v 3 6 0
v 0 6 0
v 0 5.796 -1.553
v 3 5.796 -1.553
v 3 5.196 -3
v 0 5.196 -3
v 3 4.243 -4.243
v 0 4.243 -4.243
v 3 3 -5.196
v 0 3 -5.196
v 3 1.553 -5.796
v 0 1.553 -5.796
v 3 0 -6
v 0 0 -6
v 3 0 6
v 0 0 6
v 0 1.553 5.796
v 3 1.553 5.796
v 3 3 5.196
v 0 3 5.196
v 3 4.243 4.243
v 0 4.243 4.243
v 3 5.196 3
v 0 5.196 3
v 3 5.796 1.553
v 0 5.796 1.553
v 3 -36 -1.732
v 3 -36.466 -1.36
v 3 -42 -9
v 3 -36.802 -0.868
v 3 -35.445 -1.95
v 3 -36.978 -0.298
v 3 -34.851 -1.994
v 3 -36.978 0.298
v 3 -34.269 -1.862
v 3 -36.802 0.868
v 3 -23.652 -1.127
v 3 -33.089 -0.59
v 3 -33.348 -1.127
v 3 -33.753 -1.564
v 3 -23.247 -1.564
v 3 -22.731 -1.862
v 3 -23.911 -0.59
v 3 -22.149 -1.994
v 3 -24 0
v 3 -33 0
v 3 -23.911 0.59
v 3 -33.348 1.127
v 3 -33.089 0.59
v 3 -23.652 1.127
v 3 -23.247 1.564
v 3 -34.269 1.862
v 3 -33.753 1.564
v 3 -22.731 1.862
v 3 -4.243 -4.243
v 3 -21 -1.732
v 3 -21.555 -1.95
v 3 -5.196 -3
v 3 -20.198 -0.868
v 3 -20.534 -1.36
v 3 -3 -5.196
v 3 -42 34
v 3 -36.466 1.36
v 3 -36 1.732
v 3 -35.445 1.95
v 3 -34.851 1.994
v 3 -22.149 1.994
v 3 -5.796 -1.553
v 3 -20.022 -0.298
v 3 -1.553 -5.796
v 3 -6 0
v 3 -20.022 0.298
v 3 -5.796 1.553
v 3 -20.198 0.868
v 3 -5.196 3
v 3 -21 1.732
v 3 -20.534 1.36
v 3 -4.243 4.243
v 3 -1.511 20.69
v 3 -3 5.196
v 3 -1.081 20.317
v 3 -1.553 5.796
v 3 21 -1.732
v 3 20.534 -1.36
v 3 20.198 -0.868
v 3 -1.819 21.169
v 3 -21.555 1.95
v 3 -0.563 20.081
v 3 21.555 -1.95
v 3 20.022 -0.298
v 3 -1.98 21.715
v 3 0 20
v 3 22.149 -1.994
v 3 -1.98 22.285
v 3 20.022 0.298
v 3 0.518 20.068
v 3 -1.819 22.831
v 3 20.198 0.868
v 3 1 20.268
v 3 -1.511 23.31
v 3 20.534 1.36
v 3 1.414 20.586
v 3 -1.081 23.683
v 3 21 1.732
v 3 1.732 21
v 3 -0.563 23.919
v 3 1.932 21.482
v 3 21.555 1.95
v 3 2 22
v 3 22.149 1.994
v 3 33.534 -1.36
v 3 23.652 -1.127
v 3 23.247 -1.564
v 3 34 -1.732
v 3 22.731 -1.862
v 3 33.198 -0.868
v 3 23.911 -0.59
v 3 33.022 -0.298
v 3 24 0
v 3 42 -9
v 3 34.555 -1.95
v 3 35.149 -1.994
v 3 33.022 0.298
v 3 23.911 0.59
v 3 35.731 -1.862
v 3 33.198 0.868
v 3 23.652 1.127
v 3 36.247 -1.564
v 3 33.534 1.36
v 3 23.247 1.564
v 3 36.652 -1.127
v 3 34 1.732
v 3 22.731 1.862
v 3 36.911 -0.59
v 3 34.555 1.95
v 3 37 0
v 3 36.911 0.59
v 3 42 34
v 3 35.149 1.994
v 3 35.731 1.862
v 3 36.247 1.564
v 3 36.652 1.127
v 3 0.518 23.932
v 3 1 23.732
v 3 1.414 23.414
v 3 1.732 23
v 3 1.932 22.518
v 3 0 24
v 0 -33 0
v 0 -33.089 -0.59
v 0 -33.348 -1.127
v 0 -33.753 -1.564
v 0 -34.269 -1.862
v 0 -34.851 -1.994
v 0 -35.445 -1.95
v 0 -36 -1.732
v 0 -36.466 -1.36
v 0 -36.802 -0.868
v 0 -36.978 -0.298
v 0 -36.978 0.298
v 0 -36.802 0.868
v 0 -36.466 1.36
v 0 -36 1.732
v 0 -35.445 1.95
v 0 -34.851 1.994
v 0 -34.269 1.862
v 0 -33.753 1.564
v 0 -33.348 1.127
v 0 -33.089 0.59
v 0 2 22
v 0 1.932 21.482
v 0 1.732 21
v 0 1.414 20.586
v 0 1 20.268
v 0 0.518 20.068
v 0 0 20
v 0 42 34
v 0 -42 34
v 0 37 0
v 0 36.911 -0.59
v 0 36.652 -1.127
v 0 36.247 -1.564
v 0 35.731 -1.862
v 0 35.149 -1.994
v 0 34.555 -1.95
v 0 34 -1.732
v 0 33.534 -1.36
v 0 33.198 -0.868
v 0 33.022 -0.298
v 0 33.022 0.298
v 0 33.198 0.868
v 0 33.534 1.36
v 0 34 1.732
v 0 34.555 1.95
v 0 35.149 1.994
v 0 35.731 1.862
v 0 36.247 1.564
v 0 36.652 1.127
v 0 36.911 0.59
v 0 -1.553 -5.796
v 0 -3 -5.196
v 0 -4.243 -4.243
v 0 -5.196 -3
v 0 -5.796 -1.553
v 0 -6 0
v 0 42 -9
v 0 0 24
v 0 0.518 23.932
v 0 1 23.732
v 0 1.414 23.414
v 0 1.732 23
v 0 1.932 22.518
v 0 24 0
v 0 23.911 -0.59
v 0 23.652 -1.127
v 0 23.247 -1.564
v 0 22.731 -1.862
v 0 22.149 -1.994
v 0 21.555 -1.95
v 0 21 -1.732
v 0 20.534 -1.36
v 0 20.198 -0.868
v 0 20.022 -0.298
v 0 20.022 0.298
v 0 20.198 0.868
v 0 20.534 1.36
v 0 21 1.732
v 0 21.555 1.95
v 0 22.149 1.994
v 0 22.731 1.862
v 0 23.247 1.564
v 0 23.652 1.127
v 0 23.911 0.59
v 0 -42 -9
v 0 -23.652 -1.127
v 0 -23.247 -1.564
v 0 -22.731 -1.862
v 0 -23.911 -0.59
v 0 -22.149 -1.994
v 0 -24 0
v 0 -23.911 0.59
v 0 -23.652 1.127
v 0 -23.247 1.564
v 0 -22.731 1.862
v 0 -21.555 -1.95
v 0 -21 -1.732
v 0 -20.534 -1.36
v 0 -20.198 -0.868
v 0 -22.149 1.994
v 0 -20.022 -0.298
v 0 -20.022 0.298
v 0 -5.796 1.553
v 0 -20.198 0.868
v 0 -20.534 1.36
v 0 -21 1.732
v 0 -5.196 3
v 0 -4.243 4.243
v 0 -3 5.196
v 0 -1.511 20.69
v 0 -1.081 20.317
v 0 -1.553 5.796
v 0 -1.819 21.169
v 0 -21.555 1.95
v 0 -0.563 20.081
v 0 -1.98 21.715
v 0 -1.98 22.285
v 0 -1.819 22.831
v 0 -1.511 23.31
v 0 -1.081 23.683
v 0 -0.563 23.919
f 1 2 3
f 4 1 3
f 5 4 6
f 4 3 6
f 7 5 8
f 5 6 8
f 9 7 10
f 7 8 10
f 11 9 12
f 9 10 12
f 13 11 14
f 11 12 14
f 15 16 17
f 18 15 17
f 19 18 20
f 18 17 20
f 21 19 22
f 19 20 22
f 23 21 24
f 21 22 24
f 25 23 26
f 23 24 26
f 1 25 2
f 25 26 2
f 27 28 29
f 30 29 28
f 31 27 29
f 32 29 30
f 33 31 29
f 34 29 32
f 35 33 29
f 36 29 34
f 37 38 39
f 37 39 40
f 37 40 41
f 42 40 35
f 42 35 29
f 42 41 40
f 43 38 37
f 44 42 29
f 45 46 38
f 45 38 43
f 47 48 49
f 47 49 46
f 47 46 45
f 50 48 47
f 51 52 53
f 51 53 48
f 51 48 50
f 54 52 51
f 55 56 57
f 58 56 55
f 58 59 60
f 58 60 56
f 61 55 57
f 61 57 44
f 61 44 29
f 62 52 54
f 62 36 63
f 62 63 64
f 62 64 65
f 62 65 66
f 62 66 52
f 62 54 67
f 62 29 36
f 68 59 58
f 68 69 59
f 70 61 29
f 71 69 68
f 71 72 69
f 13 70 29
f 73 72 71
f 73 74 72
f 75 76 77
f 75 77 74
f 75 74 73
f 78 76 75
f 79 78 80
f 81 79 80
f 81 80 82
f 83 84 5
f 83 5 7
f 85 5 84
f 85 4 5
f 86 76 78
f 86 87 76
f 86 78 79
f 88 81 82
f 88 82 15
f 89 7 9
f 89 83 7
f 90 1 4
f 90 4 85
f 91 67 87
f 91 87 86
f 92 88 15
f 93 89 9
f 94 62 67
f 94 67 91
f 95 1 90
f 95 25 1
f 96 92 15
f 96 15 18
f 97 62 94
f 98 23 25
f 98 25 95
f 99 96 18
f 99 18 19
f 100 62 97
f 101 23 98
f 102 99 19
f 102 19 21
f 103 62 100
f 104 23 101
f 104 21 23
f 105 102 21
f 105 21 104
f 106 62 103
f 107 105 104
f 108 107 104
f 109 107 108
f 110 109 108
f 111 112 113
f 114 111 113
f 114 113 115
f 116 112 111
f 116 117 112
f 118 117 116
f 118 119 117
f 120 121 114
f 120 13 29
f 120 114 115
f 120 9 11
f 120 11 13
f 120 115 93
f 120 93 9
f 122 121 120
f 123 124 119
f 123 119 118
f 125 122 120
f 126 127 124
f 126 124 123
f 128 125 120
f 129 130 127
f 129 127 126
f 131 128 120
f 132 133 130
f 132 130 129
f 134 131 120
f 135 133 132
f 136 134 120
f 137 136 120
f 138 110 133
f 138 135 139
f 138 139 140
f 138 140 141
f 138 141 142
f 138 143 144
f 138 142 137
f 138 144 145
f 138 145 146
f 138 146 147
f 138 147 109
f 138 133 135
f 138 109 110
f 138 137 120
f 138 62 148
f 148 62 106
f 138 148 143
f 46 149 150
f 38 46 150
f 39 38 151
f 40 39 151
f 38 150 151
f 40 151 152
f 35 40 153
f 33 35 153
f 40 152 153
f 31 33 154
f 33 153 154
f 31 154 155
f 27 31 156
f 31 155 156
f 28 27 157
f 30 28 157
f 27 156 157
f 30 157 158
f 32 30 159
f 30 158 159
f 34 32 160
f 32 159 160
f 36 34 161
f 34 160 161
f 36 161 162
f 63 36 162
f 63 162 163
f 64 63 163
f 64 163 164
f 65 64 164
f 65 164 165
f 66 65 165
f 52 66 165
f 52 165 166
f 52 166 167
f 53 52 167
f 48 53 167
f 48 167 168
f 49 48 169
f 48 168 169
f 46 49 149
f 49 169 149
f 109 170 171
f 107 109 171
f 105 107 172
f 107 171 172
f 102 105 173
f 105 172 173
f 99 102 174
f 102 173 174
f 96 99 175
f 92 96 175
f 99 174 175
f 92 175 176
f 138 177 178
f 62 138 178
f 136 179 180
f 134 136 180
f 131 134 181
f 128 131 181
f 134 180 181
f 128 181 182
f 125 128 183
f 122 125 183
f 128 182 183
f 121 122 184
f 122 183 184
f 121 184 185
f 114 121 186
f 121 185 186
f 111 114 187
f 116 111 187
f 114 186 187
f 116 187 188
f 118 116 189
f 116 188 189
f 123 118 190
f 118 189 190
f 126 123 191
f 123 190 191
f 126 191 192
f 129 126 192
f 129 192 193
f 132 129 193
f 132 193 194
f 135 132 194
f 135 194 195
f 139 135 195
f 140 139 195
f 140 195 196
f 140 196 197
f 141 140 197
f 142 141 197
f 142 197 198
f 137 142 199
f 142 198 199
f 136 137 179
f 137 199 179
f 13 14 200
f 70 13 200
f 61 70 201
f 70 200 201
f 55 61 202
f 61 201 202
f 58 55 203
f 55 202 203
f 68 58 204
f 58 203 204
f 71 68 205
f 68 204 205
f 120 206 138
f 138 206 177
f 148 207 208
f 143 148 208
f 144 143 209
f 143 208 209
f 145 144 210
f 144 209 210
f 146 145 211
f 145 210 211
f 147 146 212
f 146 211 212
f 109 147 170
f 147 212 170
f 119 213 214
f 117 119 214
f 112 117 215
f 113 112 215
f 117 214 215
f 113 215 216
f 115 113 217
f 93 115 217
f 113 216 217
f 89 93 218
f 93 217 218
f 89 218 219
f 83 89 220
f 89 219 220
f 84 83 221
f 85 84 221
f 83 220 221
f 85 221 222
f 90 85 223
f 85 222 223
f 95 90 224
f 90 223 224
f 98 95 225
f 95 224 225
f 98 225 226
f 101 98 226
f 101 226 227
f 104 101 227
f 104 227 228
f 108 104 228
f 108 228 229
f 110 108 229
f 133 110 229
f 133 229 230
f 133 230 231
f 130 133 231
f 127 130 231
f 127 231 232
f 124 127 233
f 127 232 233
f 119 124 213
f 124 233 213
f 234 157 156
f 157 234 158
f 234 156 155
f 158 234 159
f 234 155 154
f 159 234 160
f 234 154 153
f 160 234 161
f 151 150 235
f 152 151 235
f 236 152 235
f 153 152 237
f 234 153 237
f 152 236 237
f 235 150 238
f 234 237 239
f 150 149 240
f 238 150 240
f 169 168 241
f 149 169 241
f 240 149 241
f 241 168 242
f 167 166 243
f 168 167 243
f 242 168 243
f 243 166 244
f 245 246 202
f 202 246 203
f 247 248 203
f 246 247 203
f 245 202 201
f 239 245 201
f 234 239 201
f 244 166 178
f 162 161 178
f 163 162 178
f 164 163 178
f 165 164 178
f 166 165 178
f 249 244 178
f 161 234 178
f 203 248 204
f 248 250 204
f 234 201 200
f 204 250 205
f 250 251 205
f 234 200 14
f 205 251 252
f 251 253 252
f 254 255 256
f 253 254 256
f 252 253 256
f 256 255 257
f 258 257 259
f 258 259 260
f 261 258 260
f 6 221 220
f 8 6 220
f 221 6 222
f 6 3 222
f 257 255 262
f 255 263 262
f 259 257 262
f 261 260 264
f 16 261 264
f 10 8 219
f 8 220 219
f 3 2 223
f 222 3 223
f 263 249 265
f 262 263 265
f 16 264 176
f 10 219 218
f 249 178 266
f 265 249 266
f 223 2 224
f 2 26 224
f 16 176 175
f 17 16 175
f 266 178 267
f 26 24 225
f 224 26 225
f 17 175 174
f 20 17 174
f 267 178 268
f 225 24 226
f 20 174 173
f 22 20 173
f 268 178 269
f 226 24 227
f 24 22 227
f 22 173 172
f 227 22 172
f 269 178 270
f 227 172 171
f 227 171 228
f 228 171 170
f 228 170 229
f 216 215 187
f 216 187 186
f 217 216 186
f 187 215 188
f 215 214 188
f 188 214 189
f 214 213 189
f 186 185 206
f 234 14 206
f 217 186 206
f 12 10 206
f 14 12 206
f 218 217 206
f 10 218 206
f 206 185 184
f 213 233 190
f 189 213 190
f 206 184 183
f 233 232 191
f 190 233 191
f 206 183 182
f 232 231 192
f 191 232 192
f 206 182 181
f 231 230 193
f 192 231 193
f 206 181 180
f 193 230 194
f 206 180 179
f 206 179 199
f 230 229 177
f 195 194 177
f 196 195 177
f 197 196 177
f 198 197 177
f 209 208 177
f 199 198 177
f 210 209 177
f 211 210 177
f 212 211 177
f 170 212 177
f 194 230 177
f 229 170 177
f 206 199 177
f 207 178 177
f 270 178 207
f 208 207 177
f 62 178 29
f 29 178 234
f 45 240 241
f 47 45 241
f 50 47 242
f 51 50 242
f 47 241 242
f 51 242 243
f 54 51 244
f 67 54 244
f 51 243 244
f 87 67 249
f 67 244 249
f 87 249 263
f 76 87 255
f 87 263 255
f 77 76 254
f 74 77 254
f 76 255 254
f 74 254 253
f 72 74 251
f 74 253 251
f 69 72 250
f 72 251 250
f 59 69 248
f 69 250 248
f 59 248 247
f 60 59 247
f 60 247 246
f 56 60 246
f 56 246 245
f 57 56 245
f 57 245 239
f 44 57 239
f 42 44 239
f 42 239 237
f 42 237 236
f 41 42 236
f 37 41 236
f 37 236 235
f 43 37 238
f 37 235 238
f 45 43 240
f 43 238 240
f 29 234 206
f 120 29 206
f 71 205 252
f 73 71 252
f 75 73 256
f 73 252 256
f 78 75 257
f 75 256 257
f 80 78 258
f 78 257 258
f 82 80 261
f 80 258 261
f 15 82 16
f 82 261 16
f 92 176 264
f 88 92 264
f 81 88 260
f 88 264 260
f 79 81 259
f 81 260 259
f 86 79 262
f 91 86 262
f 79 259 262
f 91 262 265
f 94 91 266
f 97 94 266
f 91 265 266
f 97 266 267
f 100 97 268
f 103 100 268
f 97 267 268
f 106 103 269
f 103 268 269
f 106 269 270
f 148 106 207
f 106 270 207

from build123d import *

# Parameters (mm, degrees)
F1_DEPTH = 3


with BuildPart() as f1:
    # F0 (on Right) → F1 (new body)
    with BuildSketch(Plane.YZ):
        with BuildLine():
            Line((-33, 9), (-33, 0))
            Line((-33, 0), (-24, 0))
            ThreePointArc((-24, 0), (-26.6360389693, 6.3639610307), (-33, 9))
        make_face()
        with BuildLine():
            ThreePointArc((-37, 0), (-35, 2), (-33, 0))
            Line((-33, 0), (-33, 9))
            ThreePointArc((-33, 9), (-39.3639610307, 6.3639610307), (-42, 0))
            Line((-42, 0), (-37, 0))
        make_face()
        with BuildLine():
            Line((-24, 0), (-33, 0))
            Line((-33, 0), (-33, -9))
            ThreePointArc((-33, -9), (-26.6360389693, -6.3639610307), (-24, 0))
        make_face()
        with BuildLine():
            Line((-33, -9), (-33, 0))
            ThreePointArc((-33, 0), (-35, -2), (-37, 0))
            Line((-37, 0), (-42, 0))
            ThreePointArc((-42, 0), (-39.3639610307, -6.3639610307), (-33, -9))
        make_face()
        with BuildLine():
            ThreePointArc((-20, 0), (-22, -2), (-24, 0))
            ThreePointArc((-24, 0), (-26.6360389693, -6.3639610307), (-33, -9))
            Line((-33, -9), (-25, -9))
            Line((-25, -9), (-4.3588989435, -9))
            ThreePointArc((-4.3588989435, -9), (-8.4731632061, -5.310885546), (-10, 0))
            Line((-10, 0), (-20, 0))
        make_face()
        with BuildLine():
            ThreePointArc((-33, 9), (-26.6360389693, 6.3639610307), (-24, 0))
            ThreePointArc((-24, 0), (-22, 2), (-20, 0))
            Line((-20, 0), (-10, 0))
            ThreePointArc((-10, 0), (-7.0710678119, 7.0710678119), (0, 10))
            Line((0, 10), (0, 20))
            ThreePointArc((0, 20), (-2, 21.9999999928), (-1.44e-08, 24))
            ThreePointArc((-1.44e-08, 24), (-4.7434164964, 25.3514707334), (-8.0622577483, 29))
            Line((-8.0622577483, 29), (-9, 29))
            Line((-9, 29), (-9, 25))
            ThreePointArc((-9, 25), (-13.686291501, 13.686291501), (-25, 9))
            Line((-25, 9), (-33, 9))
        make_face()
        with BuildLine():
            ThreePointArc((-42, 0), (-39.3639610307, 6.3639610307), (-33, 9))
            Line((-33, 9), (-25, 9))
            ThreePointArc((-25, 9), (-13.686291501, 13.686291501), (-9, 25))
            Line((-9, 25), (-9, 29))
            Line((-9, 29), (-42, 29))
            Line((-42, 29), (-42, 0))
        make_face()
        with BuildLine():
            Line((-42, -9), (-33, -9))
            ThreePointArc((-33, -9), (-39.3639610307, -6.3639610307), (-42, 0))
            Line((-42, 0), (-42, -9))
        make_face()
        with BuildLine():
            ThreePointArc((0, 10), (-7.0710678119, 7.0710678119), (-10, 0))
            Line((-10, 0), (-6, 0))
            ThreePointArc((-6, 0), (-4.2426406871, 4.2426406871), (0, 6))
            Line((0, 6), (0, 10))
        make_face()
        with BuildLine():
            Line((-6, 0), (-10, 0))
            ThreePointArc((-10, 0), (-8.4731632061, -5.310885546), (-4.3588989435, -9))
            Line((-4.3588989435, -9), (0, -9))
            Line((0, -9), (0, -6))
            ThreePointArc((0, -6), (-4.2426406871, -4.2426406871), (-6, 0))
        make_face()
        with BuildLine():
            Line((-42, 34), (-42, 29))
            Line((-42, 29), (-9, 29))
            Line((-9, 29), (-9, 33))
            ThreePointArc((-9, 33), (-8.9860571774, 33.5007758031), (-8.94427191, 34))
            Line((-8.94427191, 34), (-42, 34))
        make_face()
        with BuildLine():
            ThreePointArc((10, 0), (7.0710678119, 7.0710678119), (0, 10))
            Line((0, 10), (0, 6))
            ThreePointArc((0, 6), (4.2426406871, 4.2426406871), (6, 0))
            Line((6, 0), (10, 0))
        make_face()
        with BuildLine():
            Line((0, 20), (0, 10))
            ThreePointArc((0, 10), (7.0710678119, 7.0710678119), (10, 0))
            Line((10, 0), (20, 0))
            ThreePointArc((20, 0), (22, 2), (24, 0))
            ThreePointArc((24, 0), (26.6360389693, 6.3639610307), (33, 9))
            Line((33, 9), (25, 9))
            ThreePointArc((25, 9), (13.686291501, 13.686291501), (9, 25))
            Line((9, 25), (9, 29))
            Line((9, 29), (8.0622577483, 29))
            ThreePointArc((8.0622577483, 29), (4.7434164841, 25.3514707258), (-1.44e-08, 24))
            ThreePointArc((-1.44e-08, 24), (1.4142135573, 23.4142135675), (2, 22))
            ThreePointArc((2, 22), (1.4142135624, 20.5857864376), (0, 20))
        make_face()
        with BuildLine():
            Line((-9, 33), (-9, 29))
            Line((-9, 29), (-8.0622577483, 29))
            ThreePointArc((-8.0622577483, 29), (-8.7624288794, 30.9457750531), (-9, 33))
        make_face()
        with BuildLine():
            Line((0, -6), (0, -9))
            Line((0, -9), (4.3588989435, -9))
            ThreePointArc((4.3588989435, -9), (8.4731632061, -5.310885546), (10, 0))
            Line((10, 0), (6, 0))
            ThreePointArc((6, 0), (4.2426406871, -4.2426406871), (0, -6))
        make_face()
        with BuildLine():
            Line((20, 0), (10, 0))
            ThreePointArc((10, 0), (8.4731632061, -5.310885546), (4.3588989435, -9))
            Line((4.3588989435, -9), (25, -9))
            Line((25, -9), (33, -9))
            ThreePointArc((33, -9), (26.6360389693, -6.3639610307), (24, 0))
            ThreePointArc((24, 0), (22, -2), (20, 0))
        make_face()
        with BuildLine():
            Line((0, 33), (-9, 33))
            ThreePointArc((-9, 33), (-8.7624288794, 30.9457750531), (-8.0622577483, 29))
            Line((-8.0622577483, 29), (0, 29))
            Line((0, 29), (0, 33))
        make_face()
        with BuildLine():
            ThreePointArc((-8.94427191, 34), (-8.9860571774, 33.5007758031), (-9, 33))
            Line((-9, 33), (0, 33))
            ThreePointArc((0, 33), (-1, 33.2679491924), (-1.7320508076, 34))
            Line((-1.7320508076, 34), (-8.94427191, 34))
        make_face()
        with BuildLine():
            Line((0, 29), (-8.0622577483, 29))
            ThreePointArc((-8.0622577483, 29), (-4.7434164964, 25.3514707334), (-1.44e-08, 24))
            Line((0, 24), (0, 29))
        make_face()
        with BuildLine():
            Line((0, 29), (0, 24))
            ThreePointArc((-1.44e-08, 24), (4.7434164841, 25.3514707258), (8.0622577483, 29))
            Line((8.0622577483, 29), (0, 29))
        make_face()
        with BuildLine():
            ThreePointArc((-1.7320508076, 34), (-1, 33.2679491924), (0, 33))
            Line((0, 33), (0, 34))
            Line((0, 34), (-1.7320508076, 34))
        make_face()
        with BuildLine():
            ThreePointArc((1.7320508076, 34), (1, 33.2679491924), (0, 33))
            Line((0, 33), (0, 29))
            Line((0, 29), (8.0622577483, 29))
            ThreePointArc((8.0622577483, 29), (8.7624288794, 30.9457750531), (9, 33))
            ThreePointArc((9, 33), (8.9860571774, 33.5007758031), (8.94427191, 34))
            Line((8.94427191, 34), (1.7320508076, 34))
        make_face()
        with BuildLine():
            Line((0, 34), (0, 33))
            ThreePointArc((0, 33), (1, 33.2679491924), (1.7320508076, 34))
            Line((1.7320508076, 34), (0, 34))
        make_face()
        with BuildLine():
            ThreePointArc((9, 33), (8.7624288794, 30.9457750531), (8.0622577483, 29))
            Line((8.0622577483, 29), (9, 29))
            Line((9, 29), (9, 33))
        make_face()
        with BuildLine():
            ThreePointArc((33, 9), (26.6360389693, 6.3639610307), (24, 0))
            Line((24, 0), (33, 0))
            ThreePointArc((33, 0), (35, 2), (37, 0))
            Line((37, 0), (42, 0))
            ThreePointArc((42, 0), (39.3639610307, 6.3639610307), (33, 9))
        make_face()
        with BuildLine():
            Line((33, 0), (24, 0))
            ThreePointArc((24, 0), (26.6360389693, -6.3639610307), (33, -9))
            Line((33, -9), (33, 0))
        make_face()
        with BuildLine():
            Line((42, 34), (8.94427191, 34))
            ThreePointArc((8.94427191, 34), (8.9860571774, 33.5007758031), (9, 33))
            Line((9, 33), (9, 29))
            Line((9, 29), (42, 29))
            Line((42, 29), (42, 34))
        make_face()
        with BuildLine():
            Line((33, 0), (33, -9))
            ThreePointArc((33, -9), (39.3639610307, -6.3639610307), (42, 0))
            Line((42, 0), (37, 0))
            ThreePointArc((37, 0), (35, -2), (33, 0))
        make_face()
        with BuildLine():
            ThreePointArc((42, 0), (39.3639610307, -6.3639610307), (33, -9))
            Line((33, -9), (42, -9))
            Line((42, -9), (42, 0))
        make_face()
        with BuildLine():
            Line((42, 29), (9, 29))
            Line((9, 29), (9, 25))
            ThreePointArc((9, 25), (13.686291501, 13.686291501), (25, 9))
            Line((25, 9), (33, 9))
            ThreePointArc((33, 9), (39.3639610307, 6.3639610307), (42, 0))
            Line((42, 0), (42, 29))
        make_face()
    extrude(amount=F1_DEPTH)


solid = f1.part
